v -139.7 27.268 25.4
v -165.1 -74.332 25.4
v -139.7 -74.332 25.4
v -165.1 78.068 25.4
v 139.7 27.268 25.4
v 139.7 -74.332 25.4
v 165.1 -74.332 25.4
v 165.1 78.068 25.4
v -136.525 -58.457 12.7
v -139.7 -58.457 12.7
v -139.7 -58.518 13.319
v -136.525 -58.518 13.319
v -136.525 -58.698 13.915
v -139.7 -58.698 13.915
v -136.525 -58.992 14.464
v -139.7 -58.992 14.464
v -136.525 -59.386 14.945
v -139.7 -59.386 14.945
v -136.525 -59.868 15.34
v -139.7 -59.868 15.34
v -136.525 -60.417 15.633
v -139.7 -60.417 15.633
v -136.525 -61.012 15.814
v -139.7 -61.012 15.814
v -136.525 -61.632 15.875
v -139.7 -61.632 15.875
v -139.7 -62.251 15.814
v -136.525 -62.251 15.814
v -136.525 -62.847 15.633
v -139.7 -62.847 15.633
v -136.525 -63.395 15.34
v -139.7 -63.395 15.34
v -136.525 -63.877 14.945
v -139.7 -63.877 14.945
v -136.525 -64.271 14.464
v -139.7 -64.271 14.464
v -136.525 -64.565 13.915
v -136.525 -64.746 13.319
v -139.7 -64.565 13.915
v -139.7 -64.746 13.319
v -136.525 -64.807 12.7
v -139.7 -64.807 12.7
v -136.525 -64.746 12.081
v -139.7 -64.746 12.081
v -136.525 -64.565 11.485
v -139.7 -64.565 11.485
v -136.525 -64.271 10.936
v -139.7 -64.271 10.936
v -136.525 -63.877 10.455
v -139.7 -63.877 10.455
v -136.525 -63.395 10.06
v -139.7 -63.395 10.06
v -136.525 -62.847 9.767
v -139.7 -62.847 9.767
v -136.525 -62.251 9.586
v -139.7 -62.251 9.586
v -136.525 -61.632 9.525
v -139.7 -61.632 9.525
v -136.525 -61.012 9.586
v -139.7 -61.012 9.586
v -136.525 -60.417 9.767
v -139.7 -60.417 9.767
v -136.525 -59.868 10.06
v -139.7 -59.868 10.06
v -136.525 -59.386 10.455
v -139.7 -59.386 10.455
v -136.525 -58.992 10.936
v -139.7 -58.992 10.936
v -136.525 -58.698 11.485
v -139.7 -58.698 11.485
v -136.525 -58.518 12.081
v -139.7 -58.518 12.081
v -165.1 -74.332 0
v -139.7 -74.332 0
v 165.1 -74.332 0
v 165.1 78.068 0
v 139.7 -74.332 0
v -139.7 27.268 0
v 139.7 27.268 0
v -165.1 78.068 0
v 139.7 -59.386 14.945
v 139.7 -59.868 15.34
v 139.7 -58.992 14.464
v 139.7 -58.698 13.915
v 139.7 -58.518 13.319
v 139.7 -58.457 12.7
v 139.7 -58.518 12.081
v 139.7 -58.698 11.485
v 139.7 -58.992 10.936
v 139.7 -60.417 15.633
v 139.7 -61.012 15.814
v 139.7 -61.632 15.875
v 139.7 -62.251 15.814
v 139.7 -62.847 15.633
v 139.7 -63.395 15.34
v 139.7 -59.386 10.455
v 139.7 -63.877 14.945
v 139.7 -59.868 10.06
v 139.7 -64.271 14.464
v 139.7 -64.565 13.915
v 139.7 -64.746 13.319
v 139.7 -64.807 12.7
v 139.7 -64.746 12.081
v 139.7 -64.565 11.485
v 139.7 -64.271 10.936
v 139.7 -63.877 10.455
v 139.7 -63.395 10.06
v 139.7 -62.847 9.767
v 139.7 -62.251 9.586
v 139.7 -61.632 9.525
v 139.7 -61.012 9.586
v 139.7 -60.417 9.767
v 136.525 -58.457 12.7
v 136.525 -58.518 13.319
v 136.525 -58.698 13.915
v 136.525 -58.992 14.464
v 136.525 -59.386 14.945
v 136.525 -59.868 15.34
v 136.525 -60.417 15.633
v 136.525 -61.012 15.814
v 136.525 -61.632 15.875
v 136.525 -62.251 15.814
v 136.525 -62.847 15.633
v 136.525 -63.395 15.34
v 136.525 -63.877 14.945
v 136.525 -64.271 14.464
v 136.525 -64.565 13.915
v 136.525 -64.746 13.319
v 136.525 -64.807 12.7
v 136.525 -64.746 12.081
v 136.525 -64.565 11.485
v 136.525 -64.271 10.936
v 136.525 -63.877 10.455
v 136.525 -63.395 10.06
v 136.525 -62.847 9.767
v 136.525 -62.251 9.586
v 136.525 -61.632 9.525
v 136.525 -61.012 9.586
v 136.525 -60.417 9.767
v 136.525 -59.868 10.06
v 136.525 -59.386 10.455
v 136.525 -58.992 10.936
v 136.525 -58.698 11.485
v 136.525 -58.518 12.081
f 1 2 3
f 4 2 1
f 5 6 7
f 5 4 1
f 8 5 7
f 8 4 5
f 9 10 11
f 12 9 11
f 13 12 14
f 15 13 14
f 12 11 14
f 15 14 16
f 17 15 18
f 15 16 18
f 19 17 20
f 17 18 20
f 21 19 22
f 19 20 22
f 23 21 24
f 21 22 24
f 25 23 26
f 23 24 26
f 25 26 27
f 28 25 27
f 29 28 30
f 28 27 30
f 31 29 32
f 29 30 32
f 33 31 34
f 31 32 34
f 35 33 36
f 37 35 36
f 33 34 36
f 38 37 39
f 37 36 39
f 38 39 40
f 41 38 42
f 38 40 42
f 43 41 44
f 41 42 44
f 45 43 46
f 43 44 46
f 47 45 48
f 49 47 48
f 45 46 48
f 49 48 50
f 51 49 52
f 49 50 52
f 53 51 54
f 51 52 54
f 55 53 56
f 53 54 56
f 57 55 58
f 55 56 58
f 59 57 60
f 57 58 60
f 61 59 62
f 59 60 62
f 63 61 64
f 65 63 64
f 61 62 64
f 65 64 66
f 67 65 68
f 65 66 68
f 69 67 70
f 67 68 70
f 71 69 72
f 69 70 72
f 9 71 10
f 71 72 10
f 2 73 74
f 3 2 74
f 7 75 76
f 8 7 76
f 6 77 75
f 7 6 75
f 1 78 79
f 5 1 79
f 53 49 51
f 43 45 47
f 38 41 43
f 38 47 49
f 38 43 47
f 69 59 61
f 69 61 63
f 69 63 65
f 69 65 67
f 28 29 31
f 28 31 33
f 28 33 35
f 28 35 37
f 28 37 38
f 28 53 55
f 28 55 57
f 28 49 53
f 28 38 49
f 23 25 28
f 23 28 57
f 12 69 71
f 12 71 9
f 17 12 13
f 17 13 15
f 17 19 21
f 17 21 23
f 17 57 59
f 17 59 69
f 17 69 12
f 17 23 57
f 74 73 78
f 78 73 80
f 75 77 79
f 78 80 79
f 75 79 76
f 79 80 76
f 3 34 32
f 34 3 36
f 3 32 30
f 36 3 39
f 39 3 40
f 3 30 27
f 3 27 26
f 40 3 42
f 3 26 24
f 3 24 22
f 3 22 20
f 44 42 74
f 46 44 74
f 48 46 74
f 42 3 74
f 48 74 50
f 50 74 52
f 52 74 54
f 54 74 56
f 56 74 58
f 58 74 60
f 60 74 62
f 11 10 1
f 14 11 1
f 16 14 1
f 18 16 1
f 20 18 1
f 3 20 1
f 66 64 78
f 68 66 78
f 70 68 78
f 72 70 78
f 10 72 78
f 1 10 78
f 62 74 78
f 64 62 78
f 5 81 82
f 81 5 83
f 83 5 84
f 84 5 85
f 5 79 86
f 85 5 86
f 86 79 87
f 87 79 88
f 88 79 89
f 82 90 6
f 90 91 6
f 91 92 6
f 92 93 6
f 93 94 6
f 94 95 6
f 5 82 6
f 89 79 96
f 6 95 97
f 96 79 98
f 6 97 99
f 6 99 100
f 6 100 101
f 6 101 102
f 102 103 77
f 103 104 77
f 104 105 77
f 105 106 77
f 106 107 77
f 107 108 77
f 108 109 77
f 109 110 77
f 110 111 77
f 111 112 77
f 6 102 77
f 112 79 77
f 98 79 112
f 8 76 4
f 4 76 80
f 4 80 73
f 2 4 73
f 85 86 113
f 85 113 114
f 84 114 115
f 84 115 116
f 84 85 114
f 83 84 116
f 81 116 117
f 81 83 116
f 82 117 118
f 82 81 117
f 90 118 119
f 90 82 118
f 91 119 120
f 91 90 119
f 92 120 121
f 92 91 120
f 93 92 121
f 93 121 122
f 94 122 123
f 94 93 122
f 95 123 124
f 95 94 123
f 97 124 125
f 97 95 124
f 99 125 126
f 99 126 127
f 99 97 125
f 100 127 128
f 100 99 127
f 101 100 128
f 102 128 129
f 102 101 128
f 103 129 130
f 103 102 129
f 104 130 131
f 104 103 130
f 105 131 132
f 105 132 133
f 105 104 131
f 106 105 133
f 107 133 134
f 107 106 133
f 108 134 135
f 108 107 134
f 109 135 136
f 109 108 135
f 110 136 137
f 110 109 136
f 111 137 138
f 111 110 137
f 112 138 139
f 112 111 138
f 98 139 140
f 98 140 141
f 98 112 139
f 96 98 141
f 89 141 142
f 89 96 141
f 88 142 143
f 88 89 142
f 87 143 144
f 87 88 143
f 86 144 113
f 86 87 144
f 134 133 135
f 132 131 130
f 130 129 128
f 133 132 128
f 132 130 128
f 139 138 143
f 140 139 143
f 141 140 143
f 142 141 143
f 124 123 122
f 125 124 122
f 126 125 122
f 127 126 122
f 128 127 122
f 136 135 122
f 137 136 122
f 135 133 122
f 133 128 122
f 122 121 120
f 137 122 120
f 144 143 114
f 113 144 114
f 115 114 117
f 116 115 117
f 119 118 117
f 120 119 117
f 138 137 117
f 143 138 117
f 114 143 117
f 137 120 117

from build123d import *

# Parameters (mm, degrees)
F0_W     = 279.4
F0_H     = 50.8
F1_DEPTH = 25.4
F2_R     = 3.175
F3_DEPTH = 3.175


with BuildPart() as f1:
    # F0 (on Top) → F1 (new body)
    with BuildSketch(Plane.XY):
        with Locations((0, 52.668456)):
            Rectangle(F0_W, F0_H)
        Polygon((-139.7, -74.331544), (-139.7, 27.268456), (-139.7, 78.068456), (-165.1, 78.068456), (-165.1, -74.331544), align=None)
        Polygon((139.7, 78.068456), (139.7, 27.268456), (139.7, -74.331544), (165.1, -74.331544), (165.1, 78.068456), align=None)
    extrude(amount=F1_DEPTH)

    # F2 (on face) → F3 (join)
    with BuildSketch(Plane.YZ.offset(-139.7)):
        with Locations((-61.631544, 12.7)):
            Circle(F2_R)
    extrude(amount=F3_DEPTH)

    # F4: F1 across plane


with BuildPart() as f1_1:
    add(f1.part)
    add(f1.part.mirror(Plane.YZ))


solid = f1_1.part
